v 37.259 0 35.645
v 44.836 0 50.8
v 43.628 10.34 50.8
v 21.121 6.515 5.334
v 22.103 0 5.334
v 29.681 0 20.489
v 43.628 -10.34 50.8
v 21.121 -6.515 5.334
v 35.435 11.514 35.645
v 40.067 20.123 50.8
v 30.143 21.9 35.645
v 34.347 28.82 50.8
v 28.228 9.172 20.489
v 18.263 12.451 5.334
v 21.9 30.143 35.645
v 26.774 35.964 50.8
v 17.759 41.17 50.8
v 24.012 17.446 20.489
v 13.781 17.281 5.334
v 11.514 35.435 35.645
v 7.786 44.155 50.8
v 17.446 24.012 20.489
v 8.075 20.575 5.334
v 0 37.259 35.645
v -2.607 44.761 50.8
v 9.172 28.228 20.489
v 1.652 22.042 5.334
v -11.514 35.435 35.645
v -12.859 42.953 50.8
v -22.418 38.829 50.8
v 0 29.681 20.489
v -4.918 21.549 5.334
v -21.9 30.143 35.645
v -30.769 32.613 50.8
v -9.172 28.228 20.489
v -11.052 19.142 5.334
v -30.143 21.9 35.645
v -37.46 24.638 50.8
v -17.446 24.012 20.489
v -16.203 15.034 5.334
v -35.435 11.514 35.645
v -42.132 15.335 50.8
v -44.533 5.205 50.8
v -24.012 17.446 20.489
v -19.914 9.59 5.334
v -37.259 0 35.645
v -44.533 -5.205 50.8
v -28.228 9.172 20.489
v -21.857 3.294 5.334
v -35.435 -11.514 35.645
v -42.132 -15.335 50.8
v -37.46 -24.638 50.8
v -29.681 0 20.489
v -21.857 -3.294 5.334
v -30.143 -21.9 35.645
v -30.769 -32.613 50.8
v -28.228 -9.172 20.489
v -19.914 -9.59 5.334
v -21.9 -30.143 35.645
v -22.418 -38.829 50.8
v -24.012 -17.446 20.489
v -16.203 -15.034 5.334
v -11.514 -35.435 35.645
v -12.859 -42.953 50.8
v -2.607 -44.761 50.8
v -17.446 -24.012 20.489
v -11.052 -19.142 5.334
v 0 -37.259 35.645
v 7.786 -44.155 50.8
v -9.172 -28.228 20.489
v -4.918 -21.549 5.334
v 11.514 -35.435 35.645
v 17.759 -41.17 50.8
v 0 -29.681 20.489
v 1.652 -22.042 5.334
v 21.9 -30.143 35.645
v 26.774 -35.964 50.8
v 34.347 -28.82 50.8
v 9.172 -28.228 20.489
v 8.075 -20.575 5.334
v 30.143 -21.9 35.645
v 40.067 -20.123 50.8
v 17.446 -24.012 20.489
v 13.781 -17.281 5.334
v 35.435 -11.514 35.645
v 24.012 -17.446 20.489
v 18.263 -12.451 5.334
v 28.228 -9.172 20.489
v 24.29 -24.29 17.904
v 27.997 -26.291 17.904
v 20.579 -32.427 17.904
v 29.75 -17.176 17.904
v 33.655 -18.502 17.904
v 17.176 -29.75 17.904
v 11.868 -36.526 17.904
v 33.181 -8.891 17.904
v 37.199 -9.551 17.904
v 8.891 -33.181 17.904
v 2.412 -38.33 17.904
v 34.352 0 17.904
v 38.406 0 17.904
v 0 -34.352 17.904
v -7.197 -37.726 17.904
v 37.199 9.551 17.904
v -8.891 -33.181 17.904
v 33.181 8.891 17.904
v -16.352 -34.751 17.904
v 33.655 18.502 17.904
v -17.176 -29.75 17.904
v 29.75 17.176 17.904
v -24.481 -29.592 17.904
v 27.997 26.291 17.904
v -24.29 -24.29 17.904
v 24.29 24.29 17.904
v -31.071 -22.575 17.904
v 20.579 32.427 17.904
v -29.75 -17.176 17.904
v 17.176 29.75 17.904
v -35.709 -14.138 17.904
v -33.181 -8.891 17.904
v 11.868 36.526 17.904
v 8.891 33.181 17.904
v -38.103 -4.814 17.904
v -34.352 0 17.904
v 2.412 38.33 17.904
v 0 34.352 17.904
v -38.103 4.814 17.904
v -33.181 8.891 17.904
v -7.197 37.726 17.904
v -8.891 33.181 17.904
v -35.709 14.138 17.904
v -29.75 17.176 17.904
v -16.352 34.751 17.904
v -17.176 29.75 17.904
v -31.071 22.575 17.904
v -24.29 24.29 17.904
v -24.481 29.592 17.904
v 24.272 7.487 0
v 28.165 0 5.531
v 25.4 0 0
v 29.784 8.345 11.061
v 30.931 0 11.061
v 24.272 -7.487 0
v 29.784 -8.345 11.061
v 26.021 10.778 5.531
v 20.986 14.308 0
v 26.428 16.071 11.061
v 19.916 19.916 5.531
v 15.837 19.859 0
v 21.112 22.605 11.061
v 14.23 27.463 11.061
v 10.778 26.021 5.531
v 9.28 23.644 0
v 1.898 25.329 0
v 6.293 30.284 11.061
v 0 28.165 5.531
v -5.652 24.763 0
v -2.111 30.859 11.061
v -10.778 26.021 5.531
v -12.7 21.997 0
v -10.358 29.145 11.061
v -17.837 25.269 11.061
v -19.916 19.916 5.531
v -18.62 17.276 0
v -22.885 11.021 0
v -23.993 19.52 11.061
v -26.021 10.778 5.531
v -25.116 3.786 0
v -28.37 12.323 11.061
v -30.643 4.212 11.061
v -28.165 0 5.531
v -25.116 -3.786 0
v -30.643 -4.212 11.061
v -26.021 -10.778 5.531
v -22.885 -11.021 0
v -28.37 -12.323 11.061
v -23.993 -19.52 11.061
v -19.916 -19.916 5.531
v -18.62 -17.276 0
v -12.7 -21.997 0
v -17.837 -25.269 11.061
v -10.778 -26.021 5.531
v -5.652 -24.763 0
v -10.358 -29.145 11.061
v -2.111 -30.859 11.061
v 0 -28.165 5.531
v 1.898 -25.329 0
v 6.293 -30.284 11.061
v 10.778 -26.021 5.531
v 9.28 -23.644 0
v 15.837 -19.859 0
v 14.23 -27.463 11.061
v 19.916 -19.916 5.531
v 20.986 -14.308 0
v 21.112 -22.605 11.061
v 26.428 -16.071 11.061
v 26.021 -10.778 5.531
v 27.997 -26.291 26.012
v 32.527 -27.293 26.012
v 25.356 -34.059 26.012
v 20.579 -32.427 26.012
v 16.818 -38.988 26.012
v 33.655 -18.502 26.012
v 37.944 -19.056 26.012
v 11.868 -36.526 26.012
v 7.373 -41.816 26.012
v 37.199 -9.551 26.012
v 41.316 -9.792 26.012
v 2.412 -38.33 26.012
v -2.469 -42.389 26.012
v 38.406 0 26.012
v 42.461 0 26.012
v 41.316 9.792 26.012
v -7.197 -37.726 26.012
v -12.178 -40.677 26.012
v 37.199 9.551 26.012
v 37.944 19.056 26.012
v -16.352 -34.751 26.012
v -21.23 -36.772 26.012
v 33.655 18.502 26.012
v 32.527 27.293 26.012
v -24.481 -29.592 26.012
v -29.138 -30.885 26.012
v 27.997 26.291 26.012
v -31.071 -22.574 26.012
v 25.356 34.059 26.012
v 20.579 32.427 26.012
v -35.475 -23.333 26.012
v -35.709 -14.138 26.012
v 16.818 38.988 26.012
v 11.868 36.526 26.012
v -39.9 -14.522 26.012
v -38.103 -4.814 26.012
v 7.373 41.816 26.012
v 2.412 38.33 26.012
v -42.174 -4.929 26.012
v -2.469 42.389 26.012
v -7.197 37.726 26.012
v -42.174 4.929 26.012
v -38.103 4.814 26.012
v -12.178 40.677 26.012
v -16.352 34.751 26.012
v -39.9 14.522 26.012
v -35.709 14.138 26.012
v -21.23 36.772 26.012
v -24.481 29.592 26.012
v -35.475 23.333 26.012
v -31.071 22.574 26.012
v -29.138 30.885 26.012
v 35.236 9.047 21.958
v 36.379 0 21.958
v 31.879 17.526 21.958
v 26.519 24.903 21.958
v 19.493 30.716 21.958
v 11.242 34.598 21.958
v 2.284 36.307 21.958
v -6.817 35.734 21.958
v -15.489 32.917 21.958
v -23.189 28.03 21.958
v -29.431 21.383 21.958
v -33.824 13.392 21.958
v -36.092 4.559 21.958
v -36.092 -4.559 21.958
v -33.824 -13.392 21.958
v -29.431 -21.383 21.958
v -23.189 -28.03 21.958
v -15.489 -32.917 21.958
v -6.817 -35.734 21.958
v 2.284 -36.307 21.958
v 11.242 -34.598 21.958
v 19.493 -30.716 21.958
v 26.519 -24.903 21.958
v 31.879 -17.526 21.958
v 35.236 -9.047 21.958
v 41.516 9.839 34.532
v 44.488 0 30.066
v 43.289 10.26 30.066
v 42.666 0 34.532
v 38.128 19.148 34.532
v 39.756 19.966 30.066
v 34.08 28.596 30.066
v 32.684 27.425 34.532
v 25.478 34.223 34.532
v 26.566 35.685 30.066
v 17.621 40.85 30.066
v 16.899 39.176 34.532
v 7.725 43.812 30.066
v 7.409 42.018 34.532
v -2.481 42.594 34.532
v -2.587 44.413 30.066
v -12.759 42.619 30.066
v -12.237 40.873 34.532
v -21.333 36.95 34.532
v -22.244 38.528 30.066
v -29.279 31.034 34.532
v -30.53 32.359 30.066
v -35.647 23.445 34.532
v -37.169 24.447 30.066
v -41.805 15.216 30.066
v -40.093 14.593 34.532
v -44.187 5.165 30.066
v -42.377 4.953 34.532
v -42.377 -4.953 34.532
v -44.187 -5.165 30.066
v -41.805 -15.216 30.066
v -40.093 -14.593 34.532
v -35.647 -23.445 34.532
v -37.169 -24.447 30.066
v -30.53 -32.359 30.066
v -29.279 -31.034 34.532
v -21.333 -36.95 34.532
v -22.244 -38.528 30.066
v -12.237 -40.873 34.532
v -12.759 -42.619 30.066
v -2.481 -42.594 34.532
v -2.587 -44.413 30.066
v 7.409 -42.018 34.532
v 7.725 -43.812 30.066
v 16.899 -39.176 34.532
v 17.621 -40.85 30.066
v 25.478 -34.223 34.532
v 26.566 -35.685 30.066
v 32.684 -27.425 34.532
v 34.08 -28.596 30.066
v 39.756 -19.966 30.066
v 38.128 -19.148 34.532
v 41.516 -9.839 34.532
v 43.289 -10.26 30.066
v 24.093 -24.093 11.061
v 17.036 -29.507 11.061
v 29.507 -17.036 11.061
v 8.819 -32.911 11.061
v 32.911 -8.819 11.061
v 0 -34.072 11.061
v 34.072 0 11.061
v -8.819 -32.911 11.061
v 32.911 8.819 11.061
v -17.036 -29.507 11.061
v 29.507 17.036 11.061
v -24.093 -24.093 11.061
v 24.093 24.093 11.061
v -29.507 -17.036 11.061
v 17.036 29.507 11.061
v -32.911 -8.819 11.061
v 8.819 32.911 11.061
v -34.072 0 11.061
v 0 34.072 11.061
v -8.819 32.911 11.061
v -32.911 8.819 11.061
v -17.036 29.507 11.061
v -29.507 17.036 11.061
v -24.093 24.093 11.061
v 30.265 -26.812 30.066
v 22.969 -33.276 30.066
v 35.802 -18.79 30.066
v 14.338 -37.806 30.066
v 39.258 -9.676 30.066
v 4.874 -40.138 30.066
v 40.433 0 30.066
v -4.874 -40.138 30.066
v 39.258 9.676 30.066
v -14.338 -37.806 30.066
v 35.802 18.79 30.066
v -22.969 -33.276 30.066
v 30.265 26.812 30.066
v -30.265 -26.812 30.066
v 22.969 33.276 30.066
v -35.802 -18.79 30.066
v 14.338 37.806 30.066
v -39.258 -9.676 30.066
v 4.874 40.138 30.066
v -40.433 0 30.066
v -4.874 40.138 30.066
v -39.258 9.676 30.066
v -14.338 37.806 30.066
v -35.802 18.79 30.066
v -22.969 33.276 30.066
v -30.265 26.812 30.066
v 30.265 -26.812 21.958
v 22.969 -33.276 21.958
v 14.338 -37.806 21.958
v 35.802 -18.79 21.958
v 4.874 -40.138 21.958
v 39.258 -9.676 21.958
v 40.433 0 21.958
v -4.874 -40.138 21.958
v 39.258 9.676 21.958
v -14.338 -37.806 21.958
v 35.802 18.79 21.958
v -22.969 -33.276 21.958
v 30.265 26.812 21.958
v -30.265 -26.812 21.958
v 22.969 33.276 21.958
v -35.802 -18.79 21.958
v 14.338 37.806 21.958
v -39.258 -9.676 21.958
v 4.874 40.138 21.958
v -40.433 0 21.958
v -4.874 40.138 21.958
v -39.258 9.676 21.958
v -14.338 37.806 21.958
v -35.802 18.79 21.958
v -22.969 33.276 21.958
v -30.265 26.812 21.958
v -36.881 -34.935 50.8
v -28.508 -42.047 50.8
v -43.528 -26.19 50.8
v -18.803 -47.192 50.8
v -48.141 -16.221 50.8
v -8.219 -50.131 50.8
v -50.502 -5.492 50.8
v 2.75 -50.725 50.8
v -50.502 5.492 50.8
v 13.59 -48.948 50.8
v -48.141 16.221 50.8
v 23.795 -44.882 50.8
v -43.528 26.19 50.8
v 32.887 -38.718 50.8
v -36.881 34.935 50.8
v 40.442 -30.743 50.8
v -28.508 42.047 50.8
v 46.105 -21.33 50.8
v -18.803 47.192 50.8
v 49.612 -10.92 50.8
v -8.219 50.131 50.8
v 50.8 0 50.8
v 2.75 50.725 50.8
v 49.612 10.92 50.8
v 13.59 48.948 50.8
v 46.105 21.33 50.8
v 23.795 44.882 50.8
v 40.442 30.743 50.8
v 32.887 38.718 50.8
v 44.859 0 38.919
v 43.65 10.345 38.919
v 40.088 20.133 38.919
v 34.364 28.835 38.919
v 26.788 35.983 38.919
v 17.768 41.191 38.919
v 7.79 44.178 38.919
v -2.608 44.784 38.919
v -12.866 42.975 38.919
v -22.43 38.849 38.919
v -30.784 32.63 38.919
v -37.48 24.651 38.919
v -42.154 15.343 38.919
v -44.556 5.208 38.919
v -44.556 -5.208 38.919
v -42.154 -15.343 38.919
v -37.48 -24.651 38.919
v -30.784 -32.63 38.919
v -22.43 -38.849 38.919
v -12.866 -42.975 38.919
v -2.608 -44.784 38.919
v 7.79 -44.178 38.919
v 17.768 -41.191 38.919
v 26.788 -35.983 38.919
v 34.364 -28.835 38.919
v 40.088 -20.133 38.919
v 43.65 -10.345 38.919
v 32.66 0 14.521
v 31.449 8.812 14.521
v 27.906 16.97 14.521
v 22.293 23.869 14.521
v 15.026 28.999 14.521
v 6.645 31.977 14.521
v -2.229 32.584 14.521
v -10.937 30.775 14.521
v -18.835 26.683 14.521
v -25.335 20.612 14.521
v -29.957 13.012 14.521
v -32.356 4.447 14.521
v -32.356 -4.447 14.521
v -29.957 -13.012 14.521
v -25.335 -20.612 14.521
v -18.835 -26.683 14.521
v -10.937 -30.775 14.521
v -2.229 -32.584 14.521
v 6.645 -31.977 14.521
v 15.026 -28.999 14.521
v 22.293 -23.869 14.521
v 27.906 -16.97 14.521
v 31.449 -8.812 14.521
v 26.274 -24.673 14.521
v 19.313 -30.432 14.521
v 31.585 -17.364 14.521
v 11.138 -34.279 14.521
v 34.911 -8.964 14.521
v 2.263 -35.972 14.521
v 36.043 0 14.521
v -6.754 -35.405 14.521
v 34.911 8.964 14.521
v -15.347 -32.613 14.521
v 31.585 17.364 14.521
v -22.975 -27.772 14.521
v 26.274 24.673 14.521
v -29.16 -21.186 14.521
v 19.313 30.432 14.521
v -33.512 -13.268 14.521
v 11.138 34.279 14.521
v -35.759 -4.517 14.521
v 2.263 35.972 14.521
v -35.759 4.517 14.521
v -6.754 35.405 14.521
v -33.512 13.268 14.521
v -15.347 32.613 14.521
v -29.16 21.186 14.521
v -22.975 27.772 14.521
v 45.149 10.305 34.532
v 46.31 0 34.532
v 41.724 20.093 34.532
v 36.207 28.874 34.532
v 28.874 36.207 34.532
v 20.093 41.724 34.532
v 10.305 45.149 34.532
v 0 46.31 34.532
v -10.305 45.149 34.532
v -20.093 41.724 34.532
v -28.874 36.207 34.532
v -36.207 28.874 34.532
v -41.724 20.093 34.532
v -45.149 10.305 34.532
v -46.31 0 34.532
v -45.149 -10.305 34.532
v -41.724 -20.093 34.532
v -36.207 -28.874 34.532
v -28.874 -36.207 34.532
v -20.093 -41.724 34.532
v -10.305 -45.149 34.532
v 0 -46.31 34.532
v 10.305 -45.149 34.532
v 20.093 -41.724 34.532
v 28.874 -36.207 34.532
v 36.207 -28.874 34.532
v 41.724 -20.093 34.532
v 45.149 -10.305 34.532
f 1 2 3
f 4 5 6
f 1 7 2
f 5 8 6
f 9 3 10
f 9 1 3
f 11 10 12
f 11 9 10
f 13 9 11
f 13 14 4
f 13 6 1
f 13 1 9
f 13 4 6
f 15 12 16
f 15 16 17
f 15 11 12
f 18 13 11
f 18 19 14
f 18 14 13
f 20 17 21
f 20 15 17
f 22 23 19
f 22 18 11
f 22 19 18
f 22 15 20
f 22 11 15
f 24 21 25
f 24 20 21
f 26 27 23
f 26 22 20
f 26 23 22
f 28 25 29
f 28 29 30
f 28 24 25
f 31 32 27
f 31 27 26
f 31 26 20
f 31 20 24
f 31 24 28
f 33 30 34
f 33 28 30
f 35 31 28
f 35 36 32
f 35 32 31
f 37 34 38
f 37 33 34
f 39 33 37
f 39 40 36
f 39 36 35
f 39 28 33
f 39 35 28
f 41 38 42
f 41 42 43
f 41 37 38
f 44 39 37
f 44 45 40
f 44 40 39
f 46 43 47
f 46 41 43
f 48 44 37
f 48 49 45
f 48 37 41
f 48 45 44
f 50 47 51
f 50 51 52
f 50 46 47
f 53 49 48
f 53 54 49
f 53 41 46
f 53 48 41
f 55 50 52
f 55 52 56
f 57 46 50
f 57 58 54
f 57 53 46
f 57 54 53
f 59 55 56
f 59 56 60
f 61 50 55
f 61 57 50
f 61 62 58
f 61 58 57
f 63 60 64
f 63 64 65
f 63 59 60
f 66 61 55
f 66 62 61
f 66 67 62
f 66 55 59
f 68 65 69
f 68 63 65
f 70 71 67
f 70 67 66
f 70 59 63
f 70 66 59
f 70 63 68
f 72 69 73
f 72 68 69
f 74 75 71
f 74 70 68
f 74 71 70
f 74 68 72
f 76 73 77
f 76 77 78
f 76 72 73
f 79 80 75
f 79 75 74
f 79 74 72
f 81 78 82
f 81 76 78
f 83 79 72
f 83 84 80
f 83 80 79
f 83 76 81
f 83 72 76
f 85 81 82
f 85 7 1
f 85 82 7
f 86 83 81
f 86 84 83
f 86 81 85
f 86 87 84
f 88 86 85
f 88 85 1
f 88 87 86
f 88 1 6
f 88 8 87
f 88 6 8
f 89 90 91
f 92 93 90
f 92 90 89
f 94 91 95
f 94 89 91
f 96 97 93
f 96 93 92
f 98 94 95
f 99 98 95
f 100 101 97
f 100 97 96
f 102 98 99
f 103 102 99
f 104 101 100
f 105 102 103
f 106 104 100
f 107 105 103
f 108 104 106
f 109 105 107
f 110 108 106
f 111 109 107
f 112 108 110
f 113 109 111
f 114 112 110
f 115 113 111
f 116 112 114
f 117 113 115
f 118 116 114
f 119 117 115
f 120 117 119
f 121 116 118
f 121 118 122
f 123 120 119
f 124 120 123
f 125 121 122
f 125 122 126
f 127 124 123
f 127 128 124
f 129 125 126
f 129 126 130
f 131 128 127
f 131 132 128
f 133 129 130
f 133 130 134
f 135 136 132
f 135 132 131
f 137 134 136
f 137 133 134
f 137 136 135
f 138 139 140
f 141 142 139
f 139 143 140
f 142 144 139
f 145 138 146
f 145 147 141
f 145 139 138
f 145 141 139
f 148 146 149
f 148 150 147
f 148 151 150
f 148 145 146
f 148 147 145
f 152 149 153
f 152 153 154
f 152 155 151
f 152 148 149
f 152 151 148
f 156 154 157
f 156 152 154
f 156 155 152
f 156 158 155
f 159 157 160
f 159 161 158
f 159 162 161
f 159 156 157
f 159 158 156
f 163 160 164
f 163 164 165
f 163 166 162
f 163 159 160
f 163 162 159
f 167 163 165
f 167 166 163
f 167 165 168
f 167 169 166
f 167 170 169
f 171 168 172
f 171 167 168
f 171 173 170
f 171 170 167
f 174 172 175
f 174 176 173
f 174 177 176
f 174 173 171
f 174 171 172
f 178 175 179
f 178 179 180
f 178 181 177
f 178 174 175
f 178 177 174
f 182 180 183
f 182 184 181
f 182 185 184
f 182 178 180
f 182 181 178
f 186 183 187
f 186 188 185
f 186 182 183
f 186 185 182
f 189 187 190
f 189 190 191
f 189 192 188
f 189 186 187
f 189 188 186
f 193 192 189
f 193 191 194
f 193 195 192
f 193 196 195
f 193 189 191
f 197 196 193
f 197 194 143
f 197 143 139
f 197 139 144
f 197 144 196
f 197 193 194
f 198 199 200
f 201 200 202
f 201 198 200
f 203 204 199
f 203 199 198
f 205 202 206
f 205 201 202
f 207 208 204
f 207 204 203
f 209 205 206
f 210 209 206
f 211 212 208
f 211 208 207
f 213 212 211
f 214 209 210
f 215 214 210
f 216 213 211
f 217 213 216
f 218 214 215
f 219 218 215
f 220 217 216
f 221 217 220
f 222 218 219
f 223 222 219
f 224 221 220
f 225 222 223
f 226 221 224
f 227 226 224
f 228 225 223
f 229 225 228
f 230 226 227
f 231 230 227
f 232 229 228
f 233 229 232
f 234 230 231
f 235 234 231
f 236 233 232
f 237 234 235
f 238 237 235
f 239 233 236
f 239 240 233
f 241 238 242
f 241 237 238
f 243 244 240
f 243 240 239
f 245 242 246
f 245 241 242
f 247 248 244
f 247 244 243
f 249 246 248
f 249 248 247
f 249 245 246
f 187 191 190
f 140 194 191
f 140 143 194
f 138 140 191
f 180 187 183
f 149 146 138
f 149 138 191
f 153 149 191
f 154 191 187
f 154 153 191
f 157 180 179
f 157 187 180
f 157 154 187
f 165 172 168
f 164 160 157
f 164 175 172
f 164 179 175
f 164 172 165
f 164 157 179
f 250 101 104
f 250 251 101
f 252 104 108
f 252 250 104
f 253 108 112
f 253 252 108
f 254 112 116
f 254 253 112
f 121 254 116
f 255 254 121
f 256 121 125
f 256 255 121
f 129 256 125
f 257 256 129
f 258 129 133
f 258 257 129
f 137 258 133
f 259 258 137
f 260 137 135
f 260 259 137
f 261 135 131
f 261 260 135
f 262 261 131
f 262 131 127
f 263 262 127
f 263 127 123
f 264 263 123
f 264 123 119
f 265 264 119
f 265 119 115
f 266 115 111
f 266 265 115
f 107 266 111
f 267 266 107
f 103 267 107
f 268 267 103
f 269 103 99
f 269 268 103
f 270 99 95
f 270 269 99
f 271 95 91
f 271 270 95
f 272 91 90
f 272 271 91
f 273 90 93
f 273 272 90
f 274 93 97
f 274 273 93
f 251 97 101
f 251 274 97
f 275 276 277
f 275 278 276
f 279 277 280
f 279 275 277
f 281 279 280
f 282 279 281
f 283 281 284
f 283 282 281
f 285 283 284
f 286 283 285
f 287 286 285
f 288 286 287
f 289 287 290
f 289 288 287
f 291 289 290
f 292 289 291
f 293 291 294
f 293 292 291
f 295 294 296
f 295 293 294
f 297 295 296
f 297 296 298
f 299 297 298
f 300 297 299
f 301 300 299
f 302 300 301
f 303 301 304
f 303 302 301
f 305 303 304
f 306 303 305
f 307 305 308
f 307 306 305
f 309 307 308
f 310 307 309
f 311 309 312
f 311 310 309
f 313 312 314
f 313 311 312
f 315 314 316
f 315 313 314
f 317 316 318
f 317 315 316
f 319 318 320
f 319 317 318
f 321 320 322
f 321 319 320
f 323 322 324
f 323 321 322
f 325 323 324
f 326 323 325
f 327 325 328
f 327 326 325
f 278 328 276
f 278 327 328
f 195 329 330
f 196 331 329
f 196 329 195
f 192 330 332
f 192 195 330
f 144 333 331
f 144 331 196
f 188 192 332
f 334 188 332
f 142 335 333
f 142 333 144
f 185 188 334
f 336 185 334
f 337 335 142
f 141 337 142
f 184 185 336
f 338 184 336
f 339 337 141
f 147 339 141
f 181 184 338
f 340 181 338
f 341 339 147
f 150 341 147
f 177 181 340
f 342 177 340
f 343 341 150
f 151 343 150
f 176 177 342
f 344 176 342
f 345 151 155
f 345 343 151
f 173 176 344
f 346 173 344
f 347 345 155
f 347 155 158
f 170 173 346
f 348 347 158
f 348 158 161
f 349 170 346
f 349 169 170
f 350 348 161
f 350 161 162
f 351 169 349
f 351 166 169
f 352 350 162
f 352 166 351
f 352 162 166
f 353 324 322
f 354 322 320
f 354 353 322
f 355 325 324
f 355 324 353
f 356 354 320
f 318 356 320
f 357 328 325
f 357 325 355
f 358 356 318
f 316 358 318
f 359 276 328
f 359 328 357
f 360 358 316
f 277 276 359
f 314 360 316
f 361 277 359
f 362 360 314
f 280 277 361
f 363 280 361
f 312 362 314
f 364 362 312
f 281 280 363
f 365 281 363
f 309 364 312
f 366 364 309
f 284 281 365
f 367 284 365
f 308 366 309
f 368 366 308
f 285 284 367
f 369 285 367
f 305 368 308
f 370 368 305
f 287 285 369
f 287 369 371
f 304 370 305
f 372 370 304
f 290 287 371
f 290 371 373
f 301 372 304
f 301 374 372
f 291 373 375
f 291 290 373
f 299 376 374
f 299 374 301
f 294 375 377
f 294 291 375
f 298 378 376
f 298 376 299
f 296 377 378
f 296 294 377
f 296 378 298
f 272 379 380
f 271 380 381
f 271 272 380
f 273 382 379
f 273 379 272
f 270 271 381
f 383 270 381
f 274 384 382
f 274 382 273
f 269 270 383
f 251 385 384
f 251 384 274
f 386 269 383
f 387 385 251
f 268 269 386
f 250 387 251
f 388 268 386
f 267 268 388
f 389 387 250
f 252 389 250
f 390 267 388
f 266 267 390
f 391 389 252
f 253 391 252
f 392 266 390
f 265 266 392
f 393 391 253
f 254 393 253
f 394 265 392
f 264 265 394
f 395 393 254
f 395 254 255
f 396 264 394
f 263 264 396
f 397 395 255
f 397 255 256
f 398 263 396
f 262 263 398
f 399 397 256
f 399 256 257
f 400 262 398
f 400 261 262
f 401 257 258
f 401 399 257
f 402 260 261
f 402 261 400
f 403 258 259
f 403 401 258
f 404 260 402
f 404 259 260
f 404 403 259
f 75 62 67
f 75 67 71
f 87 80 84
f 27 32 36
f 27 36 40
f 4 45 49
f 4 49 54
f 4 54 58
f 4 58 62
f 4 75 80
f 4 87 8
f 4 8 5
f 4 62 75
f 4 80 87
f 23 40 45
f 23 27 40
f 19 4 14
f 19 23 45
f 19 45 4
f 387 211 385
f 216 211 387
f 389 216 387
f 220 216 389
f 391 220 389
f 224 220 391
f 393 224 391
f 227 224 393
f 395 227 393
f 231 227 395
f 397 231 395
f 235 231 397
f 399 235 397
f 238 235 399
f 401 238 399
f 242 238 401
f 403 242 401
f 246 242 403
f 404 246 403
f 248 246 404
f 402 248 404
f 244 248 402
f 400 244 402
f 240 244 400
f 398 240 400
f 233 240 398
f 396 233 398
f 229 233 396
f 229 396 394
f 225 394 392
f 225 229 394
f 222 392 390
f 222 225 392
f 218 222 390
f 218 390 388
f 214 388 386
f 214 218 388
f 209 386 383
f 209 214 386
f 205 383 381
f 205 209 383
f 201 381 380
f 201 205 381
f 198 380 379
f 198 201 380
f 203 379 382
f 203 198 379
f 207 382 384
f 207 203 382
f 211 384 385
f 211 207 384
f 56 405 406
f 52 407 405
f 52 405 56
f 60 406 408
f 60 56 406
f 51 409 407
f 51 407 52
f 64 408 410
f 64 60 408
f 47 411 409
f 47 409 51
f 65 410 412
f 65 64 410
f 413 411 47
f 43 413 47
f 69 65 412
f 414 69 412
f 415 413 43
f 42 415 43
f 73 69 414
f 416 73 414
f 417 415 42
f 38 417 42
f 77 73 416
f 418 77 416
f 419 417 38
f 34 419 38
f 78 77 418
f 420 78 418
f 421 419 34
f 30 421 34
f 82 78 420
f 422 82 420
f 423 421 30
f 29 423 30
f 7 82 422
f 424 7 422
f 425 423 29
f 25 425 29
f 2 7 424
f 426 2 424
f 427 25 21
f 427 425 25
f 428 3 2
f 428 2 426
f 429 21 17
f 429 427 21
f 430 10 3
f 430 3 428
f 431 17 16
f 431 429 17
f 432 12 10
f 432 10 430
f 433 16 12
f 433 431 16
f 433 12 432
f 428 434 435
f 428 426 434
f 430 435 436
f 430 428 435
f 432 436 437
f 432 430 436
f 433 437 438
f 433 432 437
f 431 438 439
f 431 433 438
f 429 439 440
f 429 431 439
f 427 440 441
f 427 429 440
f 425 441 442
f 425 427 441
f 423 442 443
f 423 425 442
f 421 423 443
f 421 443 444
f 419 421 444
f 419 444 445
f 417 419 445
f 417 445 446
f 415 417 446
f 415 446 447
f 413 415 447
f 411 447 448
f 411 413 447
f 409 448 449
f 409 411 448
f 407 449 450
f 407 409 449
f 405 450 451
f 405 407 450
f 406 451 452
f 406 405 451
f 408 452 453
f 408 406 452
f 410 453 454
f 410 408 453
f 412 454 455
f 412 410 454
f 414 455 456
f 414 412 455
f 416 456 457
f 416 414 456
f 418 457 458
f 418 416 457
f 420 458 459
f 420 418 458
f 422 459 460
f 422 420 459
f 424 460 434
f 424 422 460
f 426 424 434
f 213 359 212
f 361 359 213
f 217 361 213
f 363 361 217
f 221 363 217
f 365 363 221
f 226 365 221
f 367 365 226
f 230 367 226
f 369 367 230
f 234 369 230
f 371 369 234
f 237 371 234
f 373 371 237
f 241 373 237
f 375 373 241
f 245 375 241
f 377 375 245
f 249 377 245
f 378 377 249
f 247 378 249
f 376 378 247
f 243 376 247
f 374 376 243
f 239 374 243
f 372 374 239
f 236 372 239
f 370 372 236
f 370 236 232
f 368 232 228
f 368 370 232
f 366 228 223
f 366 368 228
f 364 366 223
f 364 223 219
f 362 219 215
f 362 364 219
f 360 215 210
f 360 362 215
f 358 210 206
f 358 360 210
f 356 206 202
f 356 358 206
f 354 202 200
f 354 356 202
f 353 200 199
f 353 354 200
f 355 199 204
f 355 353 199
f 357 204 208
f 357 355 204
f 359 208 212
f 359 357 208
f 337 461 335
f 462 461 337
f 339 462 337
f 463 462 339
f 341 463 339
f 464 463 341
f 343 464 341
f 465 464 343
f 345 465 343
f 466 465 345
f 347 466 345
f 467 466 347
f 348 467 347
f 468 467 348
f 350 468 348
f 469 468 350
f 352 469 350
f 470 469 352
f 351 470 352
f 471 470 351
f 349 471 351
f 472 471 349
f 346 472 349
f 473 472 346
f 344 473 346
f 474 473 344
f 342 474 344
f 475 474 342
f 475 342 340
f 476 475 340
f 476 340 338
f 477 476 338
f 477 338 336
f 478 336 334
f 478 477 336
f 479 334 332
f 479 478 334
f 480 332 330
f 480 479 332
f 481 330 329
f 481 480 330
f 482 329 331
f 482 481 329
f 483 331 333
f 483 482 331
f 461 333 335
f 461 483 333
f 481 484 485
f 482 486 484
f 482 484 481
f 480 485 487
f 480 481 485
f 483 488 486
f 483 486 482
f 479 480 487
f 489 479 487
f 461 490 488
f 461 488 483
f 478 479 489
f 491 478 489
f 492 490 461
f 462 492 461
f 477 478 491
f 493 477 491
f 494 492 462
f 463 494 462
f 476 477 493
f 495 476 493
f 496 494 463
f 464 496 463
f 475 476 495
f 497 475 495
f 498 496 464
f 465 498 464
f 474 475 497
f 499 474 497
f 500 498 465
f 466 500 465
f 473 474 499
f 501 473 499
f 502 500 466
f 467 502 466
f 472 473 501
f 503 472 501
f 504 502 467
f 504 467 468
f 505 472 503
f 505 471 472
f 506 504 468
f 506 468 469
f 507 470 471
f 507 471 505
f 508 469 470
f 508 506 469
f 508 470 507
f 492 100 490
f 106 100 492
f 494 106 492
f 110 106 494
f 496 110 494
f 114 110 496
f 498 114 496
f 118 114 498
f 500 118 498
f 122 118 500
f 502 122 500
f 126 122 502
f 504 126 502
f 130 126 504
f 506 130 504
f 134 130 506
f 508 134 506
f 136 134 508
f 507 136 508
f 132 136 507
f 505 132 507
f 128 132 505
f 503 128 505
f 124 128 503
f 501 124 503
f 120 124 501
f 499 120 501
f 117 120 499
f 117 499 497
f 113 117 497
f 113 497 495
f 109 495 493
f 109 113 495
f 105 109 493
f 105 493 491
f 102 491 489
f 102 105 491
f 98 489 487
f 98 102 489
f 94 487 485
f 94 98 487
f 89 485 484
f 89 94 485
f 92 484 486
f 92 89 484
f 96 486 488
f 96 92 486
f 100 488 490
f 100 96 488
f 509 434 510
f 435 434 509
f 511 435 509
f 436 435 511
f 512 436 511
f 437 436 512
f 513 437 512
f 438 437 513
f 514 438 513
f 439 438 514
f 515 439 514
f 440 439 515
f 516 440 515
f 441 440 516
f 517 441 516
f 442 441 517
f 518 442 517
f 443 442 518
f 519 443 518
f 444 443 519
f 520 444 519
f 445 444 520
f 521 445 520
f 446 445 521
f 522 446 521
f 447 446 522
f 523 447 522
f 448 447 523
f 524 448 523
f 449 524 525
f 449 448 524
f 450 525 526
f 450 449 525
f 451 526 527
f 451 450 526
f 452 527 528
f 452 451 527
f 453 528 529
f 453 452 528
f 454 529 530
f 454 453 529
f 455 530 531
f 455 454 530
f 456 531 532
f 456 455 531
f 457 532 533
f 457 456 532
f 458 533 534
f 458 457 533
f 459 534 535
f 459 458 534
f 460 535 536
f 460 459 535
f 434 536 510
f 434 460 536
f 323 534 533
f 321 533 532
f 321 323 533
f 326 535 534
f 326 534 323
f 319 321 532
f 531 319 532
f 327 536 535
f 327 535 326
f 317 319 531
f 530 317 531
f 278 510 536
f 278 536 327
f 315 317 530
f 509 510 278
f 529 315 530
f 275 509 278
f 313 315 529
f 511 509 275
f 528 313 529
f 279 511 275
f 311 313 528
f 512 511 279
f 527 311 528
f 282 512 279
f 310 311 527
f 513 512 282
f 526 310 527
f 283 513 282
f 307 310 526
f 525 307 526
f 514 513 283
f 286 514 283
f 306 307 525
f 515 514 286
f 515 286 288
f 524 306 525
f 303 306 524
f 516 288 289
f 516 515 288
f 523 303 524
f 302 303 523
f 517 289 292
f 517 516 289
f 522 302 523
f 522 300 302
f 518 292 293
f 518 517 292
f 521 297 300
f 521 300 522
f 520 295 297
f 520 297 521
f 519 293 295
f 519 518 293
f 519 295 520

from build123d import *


with BuildPart() as f1:
    # F0 (on Front) → F1 (revolve)
    with BuildSketch(Plane.XZ):
        Polygon((0, 5.334), (0, 0), (25.4, 0), (30.930716, 11.061433), (32.660495, 14.520989), (34.351828, 17.903656), (36.378811, 21.957622), (38.40592, 26.01184), (40.433155, 30.066309), (42.665875, 34.53175), (44.859473, 38.918946), (50.8, 50.8), (44.836407, 50.8), (22.103407, 5.334), align=None)
        Polygon((32.660495, 14.520989), (30.930716, 11.061433), (34.072268, 11.061433), align=None)
        Polygon((34.351828, 17.903656), (32.660495, 14.520989), (36.043372, 14.520989), align=None)
        Polygon((36.378811, 21.957622), (34.351828, 17.903656), (38.406046, 17.903656), align=None)
        Polygon((46.310384, 34.53175), (44.859473, 38.918946), (42.665875, 34.53175), align=None)
        Polygon((38.40592, 26.01184), (36.378811, 21.957622), (40.433281, 21.957622), align=None)
        Polygon((44.488129, 30.066309), (42.665875, 34.53175), (40.433155, 30.066309), align=None)
        Polygon((40.433155, 30.066309), (38.40592, 26.01184), (42.460642, 26.01184), align=None)
    revolve(axis=Axis((0, 0, 25.4), (0, 0, 1)))


solid = f1.part
